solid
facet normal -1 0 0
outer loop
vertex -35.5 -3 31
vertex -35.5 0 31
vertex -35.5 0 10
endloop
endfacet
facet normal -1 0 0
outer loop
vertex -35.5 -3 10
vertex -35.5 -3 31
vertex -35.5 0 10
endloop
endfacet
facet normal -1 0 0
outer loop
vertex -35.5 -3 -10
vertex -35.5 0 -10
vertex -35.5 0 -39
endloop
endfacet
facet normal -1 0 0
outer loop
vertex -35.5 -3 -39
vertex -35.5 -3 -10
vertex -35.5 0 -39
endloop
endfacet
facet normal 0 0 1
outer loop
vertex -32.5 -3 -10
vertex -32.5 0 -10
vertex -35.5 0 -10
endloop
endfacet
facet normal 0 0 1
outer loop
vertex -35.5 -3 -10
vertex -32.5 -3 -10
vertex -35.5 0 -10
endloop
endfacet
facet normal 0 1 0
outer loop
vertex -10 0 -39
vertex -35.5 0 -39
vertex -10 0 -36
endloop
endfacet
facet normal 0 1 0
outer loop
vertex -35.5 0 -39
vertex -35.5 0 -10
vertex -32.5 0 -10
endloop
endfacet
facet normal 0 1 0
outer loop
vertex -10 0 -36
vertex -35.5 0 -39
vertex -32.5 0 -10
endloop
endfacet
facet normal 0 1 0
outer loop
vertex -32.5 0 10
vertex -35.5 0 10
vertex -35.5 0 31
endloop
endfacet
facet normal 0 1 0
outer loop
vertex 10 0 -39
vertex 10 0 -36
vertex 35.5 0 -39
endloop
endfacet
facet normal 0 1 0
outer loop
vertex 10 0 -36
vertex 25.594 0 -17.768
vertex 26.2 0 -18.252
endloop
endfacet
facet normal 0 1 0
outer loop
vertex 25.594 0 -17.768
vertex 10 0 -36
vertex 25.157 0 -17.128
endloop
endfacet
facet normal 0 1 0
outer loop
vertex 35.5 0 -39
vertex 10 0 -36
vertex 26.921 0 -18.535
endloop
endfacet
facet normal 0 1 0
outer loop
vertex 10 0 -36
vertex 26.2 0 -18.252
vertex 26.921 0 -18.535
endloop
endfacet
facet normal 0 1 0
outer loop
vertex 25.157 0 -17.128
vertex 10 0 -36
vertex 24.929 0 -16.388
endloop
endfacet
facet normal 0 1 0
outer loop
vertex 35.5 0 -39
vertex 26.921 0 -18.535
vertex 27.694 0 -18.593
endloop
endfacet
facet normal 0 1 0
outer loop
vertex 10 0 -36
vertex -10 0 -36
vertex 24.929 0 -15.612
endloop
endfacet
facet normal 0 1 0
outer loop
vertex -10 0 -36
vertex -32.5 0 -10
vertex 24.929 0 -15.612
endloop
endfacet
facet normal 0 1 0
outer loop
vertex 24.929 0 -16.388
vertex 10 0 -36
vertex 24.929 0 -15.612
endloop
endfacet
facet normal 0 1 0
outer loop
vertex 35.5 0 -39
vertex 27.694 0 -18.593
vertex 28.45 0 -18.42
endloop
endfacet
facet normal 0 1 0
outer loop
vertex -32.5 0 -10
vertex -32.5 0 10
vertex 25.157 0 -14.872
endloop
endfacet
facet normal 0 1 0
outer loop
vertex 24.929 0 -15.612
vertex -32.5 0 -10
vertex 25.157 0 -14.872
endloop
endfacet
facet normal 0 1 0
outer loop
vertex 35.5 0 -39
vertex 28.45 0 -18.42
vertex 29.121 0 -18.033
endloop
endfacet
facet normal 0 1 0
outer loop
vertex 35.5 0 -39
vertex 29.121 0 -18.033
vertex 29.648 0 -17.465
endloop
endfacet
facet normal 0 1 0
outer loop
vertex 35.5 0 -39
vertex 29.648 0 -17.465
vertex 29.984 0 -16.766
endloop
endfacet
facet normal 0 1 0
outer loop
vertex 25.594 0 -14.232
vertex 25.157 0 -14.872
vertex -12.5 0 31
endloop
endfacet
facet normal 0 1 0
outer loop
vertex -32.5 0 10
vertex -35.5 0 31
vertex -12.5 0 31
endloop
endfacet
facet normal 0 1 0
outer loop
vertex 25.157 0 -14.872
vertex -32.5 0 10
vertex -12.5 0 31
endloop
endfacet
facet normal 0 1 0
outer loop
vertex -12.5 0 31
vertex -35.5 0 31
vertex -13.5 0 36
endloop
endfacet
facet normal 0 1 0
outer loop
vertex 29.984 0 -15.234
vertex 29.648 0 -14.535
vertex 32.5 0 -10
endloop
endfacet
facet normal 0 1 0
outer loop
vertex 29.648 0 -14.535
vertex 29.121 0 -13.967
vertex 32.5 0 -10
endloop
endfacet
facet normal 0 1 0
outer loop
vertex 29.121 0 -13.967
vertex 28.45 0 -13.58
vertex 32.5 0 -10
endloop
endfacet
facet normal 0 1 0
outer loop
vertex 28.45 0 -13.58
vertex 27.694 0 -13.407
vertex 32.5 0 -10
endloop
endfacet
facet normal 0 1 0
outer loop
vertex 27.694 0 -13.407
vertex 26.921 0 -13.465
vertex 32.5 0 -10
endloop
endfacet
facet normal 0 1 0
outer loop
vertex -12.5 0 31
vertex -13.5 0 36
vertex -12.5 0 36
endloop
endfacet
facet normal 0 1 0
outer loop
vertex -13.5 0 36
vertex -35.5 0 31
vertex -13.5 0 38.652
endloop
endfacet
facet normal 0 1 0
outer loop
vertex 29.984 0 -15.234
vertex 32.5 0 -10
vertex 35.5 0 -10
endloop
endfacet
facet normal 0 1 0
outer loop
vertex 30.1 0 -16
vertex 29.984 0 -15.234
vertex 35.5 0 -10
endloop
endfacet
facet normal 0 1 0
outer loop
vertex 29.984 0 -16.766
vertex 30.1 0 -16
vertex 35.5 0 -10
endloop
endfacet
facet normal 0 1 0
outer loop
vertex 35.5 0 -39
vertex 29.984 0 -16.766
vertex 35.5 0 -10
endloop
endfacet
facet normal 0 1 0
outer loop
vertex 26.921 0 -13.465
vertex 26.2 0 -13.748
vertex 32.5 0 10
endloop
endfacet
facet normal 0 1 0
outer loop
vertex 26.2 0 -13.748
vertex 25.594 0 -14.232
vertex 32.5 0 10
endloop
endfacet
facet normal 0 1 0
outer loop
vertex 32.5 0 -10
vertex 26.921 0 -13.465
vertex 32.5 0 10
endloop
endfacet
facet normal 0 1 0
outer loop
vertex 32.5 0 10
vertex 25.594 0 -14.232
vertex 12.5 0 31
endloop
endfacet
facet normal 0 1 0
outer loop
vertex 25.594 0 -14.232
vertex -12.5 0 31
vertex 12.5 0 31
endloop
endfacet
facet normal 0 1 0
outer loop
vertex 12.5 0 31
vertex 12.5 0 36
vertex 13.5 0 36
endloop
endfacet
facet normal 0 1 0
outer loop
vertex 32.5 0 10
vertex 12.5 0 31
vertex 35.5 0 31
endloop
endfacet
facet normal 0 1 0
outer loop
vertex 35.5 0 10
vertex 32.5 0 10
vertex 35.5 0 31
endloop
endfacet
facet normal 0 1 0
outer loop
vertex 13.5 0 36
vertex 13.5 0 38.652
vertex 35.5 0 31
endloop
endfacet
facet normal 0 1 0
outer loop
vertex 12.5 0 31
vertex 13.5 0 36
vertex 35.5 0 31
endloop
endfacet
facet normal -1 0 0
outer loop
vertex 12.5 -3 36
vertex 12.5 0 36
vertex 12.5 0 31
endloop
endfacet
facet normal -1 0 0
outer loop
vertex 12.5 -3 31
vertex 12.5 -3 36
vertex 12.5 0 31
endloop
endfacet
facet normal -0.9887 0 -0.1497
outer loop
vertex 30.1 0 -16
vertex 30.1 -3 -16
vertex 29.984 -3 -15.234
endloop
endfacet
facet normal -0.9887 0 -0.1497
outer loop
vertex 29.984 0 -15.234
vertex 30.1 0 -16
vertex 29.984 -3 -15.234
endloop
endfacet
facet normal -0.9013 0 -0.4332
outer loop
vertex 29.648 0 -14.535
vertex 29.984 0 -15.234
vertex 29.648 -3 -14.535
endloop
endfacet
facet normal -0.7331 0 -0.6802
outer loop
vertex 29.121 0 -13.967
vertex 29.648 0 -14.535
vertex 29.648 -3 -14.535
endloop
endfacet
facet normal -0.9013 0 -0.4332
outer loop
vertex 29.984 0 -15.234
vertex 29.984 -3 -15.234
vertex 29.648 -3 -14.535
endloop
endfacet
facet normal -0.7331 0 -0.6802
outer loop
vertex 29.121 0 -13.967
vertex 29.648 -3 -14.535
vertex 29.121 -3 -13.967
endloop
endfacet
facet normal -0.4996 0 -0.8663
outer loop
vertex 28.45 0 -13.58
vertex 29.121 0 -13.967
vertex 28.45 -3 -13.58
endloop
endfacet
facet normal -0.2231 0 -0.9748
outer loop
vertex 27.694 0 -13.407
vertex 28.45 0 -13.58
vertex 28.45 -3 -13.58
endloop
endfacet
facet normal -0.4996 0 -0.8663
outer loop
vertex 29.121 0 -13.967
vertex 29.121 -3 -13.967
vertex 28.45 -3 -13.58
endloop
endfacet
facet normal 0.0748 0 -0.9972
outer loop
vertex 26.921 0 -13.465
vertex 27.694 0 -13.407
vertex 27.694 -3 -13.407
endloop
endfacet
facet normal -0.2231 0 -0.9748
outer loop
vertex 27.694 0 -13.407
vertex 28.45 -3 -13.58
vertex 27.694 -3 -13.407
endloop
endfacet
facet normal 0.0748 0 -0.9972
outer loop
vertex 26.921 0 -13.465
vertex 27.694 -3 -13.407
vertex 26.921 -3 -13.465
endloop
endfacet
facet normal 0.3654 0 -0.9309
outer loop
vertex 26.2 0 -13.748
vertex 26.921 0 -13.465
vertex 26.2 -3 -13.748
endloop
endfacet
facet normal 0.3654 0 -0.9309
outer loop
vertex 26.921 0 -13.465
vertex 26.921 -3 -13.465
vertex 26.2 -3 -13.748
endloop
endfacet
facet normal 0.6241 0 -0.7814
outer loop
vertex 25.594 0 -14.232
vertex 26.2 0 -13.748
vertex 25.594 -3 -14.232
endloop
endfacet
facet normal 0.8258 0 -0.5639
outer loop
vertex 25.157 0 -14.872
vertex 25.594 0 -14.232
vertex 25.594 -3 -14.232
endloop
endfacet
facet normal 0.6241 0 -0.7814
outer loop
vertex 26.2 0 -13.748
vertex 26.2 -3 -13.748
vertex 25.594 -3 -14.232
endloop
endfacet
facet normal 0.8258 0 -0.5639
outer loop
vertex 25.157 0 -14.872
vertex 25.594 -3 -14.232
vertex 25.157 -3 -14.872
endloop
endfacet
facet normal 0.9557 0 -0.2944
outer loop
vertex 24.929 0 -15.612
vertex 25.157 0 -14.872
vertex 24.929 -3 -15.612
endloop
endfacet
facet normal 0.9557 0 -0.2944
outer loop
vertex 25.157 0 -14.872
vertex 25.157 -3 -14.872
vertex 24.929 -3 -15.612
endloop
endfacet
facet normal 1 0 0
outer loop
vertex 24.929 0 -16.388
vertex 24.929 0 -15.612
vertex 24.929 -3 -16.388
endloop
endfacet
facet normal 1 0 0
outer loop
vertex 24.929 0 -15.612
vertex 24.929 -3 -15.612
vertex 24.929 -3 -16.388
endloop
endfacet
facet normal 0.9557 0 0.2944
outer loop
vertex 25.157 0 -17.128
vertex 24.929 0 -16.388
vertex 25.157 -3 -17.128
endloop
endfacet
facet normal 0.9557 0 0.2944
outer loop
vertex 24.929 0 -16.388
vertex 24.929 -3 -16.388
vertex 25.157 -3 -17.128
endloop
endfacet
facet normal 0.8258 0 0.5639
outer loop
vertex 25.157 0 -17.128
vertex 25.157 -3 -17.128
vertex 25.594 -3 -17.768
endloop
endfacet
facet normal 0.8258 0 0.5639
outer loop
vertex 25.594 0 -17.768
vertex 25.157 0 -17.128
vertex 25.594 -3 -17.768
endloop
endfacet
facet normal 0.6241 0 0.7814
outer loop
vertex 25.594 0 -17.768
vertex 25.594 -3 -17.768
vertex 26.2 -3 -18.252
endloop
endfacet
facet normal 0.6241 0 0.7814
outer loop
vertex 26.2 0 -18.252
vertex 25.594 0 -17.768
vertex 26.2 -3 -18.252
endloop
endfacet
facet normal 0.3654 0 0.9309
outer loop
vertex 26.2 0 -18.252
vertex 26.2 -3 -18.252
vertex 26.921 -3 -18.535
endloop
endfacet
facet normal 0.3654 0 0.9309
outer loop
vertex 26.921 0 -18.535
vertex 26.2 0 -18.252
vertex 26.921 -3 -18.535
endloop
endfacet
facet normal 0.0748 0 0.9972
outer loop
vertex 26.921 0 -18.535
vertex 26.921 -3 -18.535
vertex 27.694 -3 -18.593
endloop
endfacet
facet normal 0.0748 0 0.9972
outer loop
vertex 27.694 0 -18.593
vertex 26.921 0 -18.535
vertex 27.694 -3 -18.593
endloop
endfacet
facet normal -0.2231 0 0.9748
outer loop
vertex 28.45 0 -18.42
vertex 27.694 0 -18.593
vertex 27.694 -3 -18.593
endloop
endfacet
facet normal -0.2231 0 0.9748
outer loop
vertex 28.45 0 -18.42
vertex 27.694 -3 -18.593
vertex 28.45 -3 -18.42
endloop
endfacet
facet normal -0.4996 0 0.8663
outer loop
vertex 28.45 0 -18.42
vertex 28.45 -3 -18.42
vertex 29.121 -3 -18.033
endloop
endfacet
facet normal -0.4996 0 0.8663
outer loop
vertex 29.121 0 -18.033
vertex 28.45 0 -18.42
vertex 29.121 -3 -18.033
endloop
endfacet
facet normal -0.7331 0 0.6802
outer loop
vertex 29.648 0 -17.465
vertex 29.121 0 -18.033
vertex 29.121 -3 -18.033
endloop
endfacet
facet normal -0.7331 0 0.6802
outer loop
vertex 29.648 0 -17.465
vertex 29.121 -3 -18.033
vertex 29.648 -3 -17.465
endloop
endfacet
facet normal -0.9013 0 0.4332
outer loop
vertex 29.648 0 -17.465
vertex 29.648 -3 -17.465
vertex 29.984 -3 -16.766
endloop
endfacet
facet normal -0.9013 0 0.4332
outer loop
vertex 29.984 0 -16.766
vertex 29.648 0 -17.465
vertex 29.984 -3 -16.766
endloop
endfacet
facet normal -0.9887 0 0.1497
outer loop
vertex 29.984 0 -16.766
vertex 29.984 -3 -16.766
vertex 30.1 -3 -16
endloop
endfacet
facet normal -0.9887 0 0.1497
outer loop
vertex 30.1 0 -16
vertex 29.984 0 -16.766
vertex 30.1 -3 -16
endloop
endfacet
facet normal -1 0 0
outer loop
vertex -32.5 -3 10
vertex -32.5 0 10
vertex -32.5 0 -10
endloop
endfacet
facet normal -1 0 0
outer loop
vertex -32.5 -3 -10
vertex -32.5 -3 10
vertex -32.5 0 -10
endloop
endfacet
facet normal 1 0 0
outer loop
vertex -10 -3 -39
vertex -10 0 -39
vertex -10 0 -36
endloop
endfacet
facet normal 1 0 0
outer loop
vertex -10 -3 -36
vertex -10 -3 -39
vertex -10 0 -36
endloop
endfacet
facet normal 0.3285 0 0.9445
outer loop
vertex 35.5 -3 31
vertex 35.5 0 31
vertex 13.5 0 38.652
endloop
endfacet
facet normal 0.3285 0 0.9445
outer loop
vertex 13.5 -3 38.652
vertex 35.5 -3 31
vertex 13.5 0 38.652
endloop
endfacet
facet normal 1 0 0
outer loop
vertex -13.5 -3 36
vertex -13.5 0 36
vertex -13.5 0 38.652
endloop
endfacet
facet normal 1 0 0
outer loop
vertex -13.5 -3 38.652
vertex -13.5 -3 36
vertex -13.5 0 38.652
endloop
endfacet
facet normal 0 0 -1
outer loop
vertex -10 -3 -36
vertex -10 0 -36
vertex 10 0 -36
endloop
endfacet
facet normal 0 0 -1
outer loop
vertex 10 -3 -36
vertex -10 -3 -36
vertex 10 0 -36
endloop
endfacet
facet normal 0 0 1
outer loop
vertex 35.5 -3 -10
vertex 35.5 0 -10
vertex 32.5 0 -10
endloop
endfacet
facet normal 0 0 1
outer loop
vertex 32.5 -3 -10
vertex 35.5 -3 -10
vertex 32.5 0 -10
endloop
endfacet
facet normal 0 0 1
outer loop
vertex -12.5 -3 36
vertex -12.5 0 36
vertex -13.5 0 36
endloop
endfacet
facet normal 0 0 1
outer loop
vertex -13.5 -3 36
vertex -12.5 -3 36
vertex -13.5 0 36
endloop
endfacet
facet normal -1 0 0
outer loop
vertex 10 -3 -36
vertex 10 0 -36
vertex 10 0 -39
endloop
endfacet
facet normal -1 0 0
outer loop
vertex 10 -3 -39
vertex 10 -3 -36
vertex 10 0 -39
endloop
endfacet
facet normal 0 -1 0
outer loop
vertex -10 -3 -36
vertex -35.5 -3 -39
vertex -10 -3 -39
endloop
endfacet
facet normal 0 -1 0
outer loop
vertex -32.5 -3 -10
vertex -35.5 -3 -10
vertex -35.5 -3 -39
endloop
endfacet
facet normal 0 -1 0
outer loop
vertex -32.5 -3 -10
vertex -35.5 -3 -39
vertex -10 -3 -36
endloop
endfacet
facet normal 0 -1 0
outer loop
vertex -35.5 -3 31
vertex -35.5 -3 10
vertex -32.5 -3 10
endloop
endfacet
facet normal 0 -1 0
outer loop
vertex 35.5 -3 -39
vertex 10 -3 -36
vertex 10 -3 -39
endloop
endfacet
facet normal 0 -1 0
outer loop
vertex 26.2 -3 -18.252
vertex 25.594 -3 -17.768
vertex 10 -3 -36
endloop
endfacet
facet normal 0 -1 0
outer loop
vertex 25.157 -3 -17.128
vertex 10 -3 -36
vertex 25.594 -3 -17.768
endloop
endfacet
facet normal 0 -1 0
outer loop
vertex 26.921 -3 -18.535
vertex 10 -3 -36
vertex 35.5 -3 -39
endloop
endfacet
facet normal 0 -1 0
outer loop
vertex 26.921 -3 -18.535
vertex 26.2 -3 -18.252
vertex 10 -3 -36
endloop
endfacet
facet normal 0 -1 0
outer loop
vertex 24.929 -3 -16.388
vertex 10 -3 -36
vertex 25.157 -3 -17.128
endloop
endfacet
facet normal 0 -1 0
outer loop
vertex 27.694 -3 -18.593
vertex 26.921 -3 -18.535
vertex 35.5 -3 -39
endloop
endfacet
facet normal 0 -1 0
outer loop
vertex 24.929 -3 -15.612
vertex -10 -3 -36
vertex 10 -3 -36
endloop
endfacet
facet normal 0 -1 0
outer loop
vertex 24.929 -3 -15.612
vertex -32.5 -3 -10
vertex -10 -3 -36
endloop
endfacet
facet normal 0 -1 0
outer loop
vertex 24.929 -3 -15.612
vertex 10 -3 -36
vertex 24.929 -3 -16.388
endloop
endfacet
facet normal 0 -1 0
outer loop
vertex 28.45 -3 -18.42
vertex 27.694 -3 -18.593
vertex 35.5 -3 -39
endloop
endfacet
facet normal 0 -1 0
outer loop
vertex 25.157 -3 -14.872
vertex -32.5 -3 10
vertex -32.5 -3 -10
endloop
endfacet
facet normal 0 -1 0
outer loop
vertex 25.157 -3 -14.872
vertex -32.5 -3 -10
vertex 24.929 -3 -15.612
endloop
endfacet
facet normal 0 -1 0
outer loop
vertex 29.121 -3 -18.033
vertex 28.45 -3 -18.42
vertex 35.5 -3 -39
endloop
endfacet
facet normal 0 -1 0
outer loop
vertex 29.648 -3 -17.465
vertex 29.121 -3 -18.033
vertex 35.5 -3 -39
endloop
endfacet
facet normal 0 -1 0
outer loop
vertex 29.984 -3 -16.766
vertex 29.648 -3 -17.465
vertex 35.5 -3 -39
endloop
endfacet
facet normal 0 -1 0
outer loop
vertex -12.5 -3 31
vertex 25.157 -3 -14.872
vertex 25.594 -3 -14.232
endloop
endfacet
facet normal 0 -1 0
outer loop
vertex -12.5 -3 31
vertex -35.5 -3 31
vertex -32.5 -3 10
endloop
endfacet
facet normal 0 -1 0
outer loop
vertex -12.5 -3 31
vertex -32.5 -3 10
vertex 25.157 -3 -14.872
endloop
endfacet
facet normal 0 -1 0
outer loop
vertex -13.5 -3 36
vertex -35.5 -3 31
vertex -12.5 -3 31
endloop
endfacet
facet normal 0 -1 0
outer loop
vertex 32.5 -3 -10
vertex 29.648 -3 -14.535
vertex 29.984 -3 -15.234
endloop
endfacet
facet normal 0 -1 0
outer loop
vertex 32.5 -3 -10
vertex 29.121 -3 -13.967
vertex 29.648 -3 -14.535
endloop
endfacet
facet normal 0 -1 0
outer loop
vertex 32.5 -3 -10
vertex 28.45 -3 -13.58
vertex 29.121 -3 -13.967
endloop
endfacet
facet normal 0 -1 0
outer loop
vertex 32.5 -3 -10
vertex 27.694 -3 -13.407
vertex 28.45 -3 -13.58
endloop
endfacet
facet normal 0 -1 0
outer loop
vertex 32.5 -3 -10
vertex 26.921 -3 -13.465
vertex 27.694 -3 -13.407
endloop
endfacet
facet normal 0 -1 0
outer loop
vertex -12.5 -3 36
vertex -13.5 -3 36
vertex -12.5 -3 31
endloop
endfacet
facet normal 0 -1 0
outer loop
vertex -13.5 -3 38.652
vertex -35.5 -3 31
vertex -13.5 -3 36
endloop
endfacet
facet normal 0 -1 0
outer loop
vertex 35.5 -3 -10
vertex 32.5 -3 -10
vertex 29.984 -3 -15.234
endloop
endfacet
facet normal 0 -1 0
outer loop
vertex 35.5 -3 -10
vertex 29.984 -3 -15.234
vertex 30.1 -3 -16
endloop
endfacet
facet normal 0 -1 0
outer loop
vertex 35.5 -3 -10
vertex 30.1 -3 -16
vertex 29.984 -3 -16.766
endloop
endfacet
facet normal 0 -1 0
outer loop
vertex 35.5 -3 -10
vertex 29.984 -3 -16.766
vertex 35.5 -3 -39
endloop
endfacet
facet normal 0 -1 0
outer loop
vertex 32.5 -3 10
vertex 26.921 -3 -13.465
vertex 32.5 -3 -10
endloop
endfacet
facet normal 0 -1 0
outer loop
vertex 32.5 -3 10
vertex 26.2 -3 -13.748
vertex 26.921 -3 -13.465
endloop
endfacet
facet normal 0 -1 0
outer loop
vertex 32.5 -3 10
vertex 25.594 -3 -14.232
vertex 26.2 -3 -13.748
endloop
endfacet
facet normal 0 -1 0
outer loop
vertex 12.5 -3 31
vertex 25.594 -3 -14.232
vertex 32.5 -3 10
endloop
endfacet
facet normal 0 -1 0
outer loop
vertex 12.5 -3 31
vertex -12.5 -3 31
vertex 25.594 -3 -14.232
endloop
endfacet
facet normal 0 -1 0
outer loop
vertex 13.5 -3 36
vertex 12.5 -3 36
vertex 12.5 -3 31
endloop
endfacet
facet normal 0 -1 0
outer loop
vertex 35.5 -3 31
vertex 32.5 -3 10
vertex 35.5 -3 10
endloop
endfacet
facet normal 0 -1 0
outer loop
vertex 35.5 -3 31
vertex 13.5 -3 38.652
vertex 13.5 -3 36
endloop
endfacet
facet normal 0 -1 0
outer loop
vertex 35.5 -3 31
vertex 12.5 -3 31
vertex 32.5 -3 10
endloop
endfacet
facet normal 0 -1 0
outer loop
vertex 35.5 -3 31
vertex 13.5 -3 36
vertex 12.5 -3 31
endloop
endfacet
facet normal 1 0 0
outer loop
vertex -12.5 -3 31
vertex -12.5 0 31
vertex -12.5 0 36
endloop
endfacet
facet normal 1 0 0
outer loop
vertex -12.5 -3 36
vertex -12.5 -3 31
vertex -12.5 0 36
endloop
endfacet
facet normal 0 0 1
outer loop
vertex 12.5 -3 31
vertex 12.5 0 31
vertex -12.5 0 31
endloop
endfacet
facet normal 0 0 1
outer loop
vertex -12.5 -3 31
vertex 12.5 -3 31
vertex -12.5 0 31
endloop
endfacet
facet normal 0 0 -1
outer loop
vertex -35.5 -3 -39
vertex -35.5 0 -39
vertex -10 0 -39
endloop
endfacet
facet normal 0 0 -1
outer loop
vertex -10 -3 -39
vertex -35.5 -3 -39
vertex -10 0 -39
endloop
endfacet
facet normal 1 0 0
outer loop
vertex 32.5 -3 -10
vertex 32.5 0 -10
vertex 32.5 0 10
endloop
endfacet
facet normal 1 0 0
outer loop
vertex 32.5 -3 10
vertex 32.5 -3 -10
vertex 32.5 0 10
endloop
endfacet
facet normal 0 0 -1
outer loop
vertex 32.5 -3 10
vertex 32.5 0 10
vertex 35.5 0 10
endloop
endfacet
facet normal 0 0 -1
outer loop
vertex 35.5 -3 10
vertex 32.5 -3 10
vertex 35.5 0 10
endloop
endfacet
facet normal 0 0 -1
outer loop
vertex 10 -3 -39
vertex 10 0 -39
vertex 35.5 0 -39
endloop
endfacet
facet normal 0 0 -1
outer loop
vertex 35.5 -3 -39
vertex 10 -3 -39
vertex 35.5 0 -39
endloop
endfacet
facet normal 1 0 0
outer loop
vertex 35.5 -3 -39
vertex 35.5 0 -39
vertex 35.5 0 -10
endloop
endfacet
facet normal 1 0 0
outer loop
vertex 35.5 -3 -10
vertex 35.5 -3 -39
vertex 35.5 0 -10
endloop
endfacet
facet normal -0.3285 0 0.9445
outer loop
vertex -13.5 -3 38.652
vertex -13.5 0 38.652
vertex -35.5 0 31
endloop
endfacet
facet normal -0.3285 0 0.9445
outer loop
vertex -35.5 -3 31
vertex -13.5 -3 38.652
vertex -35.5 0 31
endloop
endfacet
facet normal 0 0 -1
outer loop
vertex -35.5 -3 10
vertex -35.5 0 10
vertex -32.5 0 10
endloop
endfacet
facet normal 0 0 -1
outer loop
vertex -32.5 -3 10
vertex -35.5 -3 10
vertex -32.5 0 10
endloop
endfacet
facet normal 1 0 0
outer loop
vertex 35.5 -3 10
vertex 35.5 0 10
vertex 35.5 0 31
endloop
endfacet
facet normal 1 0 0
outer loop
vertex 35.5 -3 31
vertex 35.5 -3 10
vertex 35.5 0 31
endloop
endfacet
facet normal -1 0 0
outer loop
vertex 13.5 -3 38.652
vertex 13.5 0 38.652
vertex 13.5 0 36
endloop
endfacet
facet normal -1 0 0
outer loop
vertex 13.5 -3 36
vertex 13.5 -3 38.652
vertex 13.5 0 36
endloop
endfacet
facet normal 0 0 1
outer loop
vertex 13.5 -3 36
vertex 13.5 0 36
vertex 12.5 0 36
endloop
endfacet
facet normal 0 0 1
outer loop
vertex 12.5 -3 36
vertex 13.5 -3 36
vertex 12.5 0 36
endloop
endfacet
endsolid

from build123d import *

# Parameters (mm, degrees)
F1_DEPTH = 3
F2_R     = 2.6
F3_DEPTH = 25


with BuildPart() as f1:
    # F0 (on Front) → F1 (new body)
    with BuildSketch(Plane.XZ):
        Polygon((-12.5, 31), (-35.5, 31), (-35.5, 10), (-32.5, 10), (-32.5, -10), (-35.5, -10), (-35.5, -39), (-10, -39), (-10, -36), (10, -36), (10, -39), (35.5, -39), (35.5, -10), (32.5, -10), (32.5, 10), (35.5, 10), (35.5, 31), (12.5, 31), align=None)
        Polygon((-13.5, 38.652174), (-35.5, 31), (-12.5, 31), (-12.5, 36), (-13.5, 36), align=None)
        Polygon((12.5, 36), (12.5, 31), (35.5, 31), (13.5, 38.652174), (13.5, 36), align=None)
    extrude(amount=F1_DEPTH)

    # F2 (on face) → F3 (cut)
    with BuildSketch(Plane.XZ.offset(3)):
        with Locations((27.5, -16)):
            Circle(F2_R)
    extrude(amount=-F3_DEPTH, mode=Mode.SUBTRACT)


solid = f1.part
